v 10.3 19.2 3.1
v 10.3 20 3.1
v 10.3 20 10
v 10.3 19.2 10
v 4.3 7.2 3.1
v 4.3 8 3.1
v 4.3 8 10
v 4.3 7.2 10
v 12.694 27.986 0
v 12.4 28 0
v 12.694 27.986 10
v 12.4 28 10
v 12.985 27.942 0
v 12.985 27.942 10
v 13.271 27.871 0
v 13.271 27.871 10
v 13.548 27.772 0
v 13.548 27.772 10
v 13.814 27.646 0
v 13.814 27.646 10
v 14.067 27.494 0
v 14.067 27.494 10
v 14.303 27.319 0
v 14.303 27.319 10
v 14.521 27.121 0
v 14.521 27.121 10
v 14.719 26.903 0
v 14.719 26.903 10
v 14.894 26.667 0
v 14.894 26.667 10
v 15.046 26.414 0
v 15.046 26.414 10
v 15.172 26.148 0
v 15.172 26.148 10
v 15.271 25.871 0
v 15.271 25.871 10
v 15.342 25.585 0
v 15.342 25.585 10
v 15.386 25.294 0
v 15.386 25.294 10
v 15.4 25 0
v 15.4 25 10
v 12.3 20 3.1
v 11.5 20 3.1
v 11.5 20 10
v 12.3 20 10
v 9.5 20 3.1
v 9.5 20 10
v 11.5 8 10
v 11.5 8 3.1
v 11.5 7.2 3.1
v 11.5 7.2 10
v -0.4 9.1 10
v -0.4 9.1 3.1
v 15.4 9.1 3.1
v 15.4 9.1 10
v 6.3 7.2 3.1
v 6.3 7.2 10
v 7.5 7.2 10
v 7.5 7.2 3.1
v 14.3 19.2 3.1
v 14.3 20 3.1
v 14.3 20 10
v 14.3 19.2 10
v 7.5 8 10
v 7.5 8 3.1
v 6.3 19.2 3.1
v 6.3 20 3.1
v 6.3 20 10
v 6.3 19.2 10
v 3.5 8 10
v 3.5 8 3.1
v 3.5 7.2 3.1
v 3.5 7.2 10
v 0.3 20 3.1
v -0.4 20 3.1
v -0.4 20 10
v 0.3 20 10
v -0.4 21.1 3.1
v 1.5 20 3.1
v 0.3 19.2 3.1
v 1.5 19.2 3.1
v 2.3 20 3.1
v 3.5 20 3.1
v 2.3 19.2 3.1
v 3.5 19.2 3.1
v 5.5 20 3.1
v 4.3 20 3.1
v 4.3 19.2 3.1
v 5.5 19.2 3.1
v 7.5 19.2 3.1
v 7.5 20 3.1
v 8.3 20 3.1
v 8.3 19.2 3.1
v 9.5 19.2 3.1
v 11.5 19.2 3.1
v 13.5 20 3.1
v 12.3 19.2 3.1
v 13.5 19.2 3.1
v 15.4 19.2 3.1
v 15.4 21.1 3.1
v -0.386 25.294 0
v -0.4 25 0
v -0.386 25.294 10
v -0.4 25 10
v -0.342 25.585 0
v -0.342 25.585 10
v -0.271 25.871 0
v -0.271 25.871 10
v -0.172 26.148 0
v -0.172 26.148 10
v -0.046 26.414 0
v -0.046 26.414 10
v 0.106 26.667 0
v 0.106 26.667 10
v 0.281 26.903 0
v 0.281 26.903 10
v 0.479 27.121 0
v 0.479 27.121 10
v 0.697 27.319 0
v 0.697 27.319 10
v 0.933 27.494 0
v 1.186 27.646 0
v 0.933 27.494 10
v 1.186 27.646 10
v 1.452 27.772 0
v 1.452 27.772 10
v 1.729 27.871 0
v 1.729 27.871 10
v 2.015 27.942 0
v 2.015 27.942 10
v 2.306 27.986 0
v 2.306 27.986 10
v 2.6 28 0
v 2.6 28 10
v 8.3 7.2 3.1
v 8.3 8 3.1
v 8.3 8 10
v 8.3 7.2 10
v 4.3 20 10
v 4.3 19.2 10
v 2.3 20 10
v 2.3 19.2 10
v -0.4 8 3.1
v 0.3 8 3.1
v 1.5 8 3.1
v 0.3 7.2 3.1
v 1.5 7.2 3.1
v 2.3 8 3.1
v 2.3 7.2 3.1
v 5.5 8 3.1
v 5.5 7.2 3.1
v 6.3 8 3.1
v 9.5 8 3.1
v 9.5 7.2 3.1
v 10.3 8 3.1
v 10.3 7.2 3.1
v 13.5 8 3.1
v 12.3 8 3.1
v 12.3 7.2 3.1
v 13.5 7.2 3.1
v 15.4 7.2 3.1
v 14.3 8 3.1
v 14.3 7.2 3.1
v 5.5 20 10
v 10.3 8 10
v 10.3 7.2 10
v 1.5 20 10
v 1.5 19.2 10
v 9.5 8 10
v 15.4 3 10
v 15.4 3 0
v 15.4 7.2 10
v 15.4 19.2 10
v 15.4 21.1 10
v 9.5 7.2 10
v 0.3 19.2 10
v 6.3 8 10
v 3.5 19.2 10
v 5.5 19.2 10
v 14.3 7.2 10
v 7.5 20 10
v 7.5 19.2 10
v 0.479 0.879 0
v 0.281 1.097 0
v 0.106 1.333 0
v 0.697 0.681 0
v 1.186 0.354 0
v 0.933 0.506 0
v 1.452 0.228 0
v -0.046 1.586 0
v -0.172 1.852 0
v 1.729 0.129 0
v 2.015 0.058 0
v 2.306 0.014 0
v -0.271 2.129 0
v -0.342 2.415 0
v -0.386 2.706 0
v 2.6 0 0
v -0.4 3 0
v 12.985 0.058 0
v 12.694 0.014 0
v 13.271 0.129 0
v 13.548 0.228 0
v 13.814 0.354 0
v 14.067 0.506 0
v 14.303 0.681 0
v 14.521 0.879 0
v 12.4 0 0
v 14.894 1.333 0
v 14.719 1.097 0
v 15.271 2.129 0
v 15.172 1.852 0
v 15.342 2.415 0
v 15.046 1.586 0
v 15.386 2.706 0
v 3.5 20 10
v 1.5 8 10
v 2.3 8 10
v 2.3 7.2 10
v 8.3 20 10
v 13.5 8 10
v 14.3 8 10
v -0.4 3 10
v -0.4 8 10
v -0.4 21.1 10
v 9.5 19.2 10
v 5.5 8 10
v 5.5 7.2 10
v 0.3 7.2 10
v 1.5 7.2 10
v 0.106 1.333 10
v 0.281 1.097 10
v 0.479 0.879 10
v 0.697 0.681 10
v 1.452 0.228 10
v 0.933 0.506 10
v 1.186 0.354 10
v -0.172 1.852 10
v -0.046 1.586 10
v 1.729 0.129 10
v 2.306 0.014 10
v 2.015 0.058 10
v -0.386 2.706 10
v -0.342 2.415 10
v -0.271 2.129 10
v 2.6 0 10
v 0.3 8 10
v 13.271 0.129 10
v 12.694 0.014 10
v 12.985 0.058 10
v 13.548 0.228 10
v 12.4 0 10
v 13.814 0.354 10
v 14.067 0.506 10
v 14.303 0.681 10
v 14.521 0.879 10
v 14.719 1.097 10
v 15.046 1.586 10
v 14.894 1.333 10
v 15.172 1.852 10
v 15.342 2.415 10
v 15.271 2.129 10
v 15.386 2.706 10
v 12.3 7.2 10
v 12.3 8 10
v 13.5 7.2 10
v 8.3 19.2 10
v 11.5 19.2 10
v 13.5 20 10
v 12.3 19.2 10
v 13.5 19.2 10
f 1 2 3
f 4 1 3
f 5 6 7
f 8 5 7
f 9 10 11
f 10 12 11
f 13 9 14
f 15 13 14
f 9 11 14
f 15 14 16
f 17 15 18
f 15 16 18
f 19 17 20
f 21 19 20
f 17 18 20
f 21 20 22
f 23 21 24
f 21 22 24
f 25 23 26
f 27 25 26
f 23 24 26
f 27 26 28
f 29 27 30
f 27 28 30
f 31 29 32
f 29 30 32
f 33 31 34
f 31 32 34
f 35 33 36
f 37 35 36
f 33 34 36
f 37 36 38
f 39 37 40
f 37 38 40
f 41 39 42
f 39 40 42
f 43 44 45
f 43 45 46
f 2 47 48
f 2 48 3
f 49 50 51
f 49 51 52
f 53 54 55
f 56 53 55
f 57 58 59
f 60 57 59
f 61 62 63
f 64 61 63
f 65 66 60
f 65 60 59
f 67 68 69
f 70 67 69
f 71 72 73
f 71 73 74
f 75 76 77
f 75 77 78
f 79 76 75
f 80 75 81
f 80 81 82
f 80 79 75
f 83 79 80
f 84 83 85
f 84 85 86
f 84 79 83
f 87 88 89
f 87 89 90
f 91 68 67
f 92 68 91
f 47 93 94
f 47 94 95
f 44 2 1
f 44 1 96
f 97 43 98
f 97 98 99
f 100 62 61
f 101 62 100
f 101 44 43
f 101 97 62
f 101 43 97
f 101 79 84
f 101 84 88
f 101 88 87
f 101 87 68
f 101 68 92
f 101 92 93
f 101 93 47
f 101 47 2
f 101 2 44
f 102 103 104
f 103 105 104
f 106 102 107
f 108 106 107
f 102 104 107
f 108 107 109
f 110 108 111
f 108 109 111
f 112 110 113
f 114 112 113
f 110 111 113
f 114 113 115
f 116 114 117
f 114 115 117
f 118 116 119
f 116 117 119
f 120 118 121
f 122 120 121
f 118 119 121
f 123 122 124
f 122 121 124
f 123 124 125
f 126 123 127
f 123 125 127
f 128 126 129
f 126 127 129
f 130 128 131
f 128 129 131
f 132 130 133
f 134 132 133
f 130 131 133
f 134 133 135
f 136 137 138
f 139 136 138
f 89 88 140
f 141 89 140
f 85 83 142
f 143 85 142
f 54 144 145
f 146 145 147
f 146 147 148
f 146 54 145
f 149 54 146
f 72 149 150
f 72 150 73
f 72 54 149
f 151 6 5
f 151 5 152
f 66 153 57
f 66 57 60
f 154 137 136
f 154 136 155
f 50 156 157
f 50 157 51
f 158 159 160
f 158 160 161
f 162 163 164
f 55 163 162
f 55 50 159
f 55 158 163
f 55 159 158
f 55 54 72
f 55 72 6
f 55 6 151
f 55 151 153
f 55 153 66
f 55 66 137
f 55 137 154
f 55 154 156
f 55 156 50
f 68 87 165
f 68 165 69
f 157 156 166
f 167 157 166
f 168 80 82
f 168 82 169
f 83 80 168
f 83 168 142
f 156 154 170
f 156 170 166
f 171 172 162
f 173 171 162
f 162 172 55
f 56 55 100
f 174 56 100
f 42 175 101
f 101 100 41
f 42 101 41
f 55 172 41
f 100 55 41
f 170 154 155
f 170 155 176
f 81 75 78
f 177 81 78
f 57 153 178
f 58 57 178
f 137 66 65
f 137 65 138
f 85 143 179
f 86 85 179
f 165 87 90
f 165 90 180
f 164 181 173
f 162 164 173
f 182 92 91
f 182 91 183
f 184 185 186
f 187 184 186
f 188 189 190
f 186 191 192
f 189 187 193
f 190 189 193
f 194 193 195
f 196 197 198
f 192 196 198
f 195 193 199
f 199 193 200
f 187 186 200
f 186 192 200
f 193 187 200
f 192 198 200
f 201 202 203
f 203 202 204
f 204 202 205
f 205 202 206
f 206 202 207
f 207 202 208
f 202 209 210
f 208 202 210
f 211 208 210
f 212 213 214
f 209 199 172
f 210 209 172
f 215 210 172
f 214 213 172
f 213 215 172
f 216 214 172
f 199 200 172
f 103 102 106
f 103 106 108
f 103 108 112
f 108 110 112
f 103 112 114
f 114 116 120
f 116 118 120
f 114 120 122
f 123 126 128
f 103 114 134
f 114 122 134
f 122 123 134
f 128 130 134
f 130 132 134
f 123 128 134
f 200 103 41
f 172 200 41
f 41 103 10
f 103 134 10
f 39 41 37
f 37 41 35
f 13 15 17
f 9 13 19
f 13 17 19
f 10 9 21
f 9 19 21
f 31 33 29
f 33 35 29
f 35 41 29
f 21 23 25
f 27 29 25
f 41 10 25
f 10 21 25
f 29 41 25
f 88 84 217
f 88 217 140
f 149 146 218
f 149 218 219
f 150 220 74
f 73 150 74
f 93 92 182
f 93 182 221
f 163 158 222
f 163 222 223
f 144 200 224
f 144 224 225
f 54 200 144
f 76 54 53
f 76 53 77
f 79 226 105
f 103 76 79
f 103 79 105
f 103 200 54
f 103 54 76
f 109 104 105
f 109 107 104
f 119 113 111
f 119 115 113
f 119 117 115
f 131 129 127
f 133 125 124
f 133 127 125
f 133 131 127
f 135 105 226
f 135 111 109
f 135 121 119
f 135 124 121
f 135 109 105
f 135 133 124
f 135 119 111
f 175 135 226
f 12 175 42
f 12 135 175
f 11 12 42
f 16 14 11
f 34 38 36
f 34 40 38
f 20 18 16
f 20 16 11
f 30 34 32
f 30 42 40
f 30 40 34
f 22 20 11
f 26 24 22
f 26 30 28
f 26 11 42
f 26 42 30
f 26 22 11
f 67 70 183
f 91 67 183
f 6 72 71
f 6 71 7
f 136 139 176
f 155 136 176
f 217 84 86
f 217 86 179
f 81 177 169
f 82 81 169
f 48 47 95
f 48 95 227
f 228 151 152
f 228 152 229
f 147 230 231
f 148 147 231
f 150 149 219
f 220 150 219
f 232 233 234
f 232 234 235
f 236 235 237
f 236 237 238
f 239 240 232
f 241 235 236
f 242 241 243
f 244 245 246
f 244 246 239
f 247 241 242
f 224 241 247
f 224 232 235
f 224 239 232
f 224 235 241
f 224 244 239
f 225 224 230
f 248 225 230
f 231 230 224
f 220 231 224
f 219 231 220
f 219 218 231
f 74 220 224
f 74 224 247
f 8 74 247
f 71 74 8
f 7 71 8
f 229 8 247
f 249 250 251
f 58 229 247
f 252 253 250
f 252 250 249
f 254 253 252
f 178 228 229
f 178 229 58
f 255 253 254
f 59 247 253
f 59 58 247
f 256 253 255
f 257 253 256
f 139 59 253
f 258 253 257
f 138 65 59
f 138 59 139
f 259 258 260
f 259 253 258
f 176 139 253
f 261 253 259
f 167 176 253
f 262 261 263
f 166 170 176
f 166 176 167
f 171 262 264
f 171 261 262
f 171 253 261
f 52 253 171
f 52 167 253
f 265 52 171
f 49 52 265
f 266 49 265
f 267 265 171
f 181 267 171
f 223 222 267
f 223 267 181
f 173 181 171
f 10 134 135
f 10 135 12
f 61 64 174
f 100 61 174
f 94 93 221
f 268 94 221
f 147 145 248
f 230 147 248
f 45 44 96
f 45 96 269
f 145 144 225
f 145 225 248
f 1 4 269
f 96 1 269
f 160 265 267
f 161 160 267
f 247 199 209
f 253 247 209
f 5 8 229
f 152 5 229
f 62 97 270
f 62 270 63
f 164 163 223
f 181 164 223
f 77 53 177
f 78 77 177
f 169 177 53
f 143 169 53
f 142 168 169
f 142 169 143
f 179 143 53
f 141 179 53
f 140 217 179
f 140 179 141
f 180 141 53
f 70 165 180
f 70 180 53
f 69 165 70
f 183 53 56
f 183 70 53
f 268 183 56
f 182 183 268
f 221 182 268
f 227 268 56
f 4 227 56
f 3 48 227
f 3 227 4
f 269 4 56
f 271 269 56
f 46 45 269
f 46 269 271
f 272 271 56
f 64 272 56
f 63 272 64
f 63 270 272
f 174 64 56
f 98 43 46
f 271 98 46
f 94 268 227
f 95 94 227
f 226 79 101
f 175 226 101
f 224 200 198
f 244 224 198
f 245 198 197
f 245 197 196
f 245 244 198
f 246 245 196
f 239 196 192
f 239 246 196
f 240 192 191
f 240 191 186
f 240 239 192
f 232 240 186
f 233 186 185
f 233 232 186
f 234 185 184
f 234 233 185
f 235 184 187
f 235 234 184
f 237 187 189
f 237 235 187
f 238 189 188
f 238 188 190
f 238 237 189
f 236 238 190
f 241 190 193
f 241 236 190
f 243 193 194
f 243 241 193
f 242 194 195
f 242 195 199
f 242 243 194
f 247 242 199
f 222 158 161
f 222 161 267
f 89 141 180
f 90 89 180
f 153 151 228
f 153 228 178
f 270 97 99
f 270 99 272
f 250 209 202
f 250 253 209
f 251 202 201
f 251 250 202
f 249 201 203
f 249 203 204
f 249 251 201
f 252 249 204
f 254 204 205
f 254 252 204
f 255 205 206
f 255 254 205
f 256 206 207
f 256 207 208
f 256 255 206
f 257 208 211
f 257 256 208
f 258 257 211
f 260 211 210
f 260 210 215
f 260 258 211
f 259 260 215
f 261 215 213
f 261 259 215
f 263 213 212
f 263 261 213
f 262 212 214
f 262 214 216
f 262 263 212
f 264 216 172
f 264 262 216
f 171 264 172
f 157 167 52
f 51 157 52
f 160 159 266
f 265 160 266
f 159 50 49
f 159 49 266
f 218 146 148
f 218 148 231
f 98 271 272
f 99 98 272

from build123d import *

# Parameters (mm, degrees)
BOX_W        = 19
BOX_H        = 1.1
BOX_DEPTH    = 7
SKETCH015_W  = 1.2
SKETCH015_H  = 7
PAD_DEPTH    = 0.8
BOX002_W     = 19
BOX002_H     = 1.1
BOX002_DEPTH = 7
SKETCH016_W  = 1.2
SKETCH016_H  = 7
PAD001_DEPTH = 0.8
BOX001_W     = 15.8
BOX001_H     = 28
BOX001_DEPTH = 10
FILLET_R     = 3


with BuildPart() as pad:
    # Box → Box (new body)
    with BuildSketch(Plane(origin=(-0.5, 20, 3.1), x_dir=(1, 0, 0), z_dir=(0, 0, 1))):
        with Locations((9.5, 0.55)):
            Rectangle(BOX_W, BOX_H)
    extrude(amount=BOX_DEPTH)

    # Sketch015 → Pad (new body)
    with BuildSketch(Plane(origin=(-0.5, 20, 3.1), x_dir=(1, 0, 0), z_dir=(0, -1, 0))):
        with Locations((1.4, 3.5)):
            Rectangle(SKETCH015_W, SKETCH015_H)
        with Locations((3.4, 3.5)):
            Rectangle(SKETCH015_W, SKETCH015_H)
        with Locations((5.4, 3.5)):
            Rectangle(SKETCH015_W, SKETCH015_H)
        with Locations((7.4, 3.5)):
            Rectangle(SKETCH015_W, SKETCH015_H)
        with Locations((9.4, 3.5)):
            Rectangle(SKETCH015_W, SKETCH015_H)
        with Locations((11.4, 3.5)):
            Rectangle(SKETCH015_W, SKETCH015_H)
        with Locations((13.4, 3.5)):
            Rectangle(SKETCH015_W, SKETCH015_H)
        with Locations((15.4, 3.5)):
            Rectangle(SKETCH015_W, SKETCH015_H)
    extrude(amount=PAD_DEPTH)


with BuildPart() as pad001:
    # Box002 → Box002 (new body)
    with BuildSketch(Plane(origin=(-0.5, 8, 3.1), x_dir=(1, 0, 0), z_dir=(0, 0, 1))):
        with Locations((9.5, 0.55)):
            Rectangle(BOX002_W, BOX002_H)
    extrude(amount=BOX002_DEPTH)

    # Sketch016 → Pad001 (new body)
    with BuildSketch(Plane(origin=(-0.5, 8, 3.1), x_dir=(1, 0, 0), z_dir=(0, -1, 0))):
        with Locations((1.4, 3.5)):
            Rectangle(SKETCH016_W, SKETCH016_H)
        with Locations((3.4, 3.5)):
            Rectangle(SKETCH016_W, SKETCH016_H)
        with Locations((5.4, 3.5)):
            Rectangle(SKETCH016_W, SKETCH016_H)
        with Locations((7.4, 3.5)):
            Rectangle(SKETCH016_W, SKETCH016_H)
        with Locations((9.4, 3.5)):
            Rectangle(SKETCH016_W, SKETCH016_H)
        with Locations((11.4, 3.5)):
            Rectangle(SKETCH016_W, SKETCH016_H)
        with Locations((13.4, 3.5)):
            Rectangle(SKETCH016_W, SKETCH016_H)
        with Locations((15.4, 3.5)):
            Rectangle(SKETCH016_W, SKETCH016_H)
    extrude(amount=PAD001_DEPTH)


with BuildPart() as fillet_body:
    # Box001 → Box001 (new body)
    with BuildSketch(Plane(origin=(-0.4, 0, 0), x_dir=(1, 0, 0), z_dir=(0, 0, 1))):
        with Locations((7.9, 14)):
            Rectangle(BOX001_W, BOX001_H)
    extrude(amount=BOX001_DEPTH)

    # Cut: cut Pad001
    add(pad001.part, mode=Mode.SUBTRACT)

    # Cut001: cut Pad
    add(pad.part, mode=Mode.SUBTRACT)

    # Fillet
    fillet_edges = [fillet_body.edges().sort_by_distance(p)[0] for p in [
        (-0.4, 28, 5),
        (-0.4, 0, 5),
        (15.4, 28, 5),
        (15.4, 0, 5),
    ]]
    fillet(fillet_edges, radius=FILLET_R)


solid = fillet_body.part
